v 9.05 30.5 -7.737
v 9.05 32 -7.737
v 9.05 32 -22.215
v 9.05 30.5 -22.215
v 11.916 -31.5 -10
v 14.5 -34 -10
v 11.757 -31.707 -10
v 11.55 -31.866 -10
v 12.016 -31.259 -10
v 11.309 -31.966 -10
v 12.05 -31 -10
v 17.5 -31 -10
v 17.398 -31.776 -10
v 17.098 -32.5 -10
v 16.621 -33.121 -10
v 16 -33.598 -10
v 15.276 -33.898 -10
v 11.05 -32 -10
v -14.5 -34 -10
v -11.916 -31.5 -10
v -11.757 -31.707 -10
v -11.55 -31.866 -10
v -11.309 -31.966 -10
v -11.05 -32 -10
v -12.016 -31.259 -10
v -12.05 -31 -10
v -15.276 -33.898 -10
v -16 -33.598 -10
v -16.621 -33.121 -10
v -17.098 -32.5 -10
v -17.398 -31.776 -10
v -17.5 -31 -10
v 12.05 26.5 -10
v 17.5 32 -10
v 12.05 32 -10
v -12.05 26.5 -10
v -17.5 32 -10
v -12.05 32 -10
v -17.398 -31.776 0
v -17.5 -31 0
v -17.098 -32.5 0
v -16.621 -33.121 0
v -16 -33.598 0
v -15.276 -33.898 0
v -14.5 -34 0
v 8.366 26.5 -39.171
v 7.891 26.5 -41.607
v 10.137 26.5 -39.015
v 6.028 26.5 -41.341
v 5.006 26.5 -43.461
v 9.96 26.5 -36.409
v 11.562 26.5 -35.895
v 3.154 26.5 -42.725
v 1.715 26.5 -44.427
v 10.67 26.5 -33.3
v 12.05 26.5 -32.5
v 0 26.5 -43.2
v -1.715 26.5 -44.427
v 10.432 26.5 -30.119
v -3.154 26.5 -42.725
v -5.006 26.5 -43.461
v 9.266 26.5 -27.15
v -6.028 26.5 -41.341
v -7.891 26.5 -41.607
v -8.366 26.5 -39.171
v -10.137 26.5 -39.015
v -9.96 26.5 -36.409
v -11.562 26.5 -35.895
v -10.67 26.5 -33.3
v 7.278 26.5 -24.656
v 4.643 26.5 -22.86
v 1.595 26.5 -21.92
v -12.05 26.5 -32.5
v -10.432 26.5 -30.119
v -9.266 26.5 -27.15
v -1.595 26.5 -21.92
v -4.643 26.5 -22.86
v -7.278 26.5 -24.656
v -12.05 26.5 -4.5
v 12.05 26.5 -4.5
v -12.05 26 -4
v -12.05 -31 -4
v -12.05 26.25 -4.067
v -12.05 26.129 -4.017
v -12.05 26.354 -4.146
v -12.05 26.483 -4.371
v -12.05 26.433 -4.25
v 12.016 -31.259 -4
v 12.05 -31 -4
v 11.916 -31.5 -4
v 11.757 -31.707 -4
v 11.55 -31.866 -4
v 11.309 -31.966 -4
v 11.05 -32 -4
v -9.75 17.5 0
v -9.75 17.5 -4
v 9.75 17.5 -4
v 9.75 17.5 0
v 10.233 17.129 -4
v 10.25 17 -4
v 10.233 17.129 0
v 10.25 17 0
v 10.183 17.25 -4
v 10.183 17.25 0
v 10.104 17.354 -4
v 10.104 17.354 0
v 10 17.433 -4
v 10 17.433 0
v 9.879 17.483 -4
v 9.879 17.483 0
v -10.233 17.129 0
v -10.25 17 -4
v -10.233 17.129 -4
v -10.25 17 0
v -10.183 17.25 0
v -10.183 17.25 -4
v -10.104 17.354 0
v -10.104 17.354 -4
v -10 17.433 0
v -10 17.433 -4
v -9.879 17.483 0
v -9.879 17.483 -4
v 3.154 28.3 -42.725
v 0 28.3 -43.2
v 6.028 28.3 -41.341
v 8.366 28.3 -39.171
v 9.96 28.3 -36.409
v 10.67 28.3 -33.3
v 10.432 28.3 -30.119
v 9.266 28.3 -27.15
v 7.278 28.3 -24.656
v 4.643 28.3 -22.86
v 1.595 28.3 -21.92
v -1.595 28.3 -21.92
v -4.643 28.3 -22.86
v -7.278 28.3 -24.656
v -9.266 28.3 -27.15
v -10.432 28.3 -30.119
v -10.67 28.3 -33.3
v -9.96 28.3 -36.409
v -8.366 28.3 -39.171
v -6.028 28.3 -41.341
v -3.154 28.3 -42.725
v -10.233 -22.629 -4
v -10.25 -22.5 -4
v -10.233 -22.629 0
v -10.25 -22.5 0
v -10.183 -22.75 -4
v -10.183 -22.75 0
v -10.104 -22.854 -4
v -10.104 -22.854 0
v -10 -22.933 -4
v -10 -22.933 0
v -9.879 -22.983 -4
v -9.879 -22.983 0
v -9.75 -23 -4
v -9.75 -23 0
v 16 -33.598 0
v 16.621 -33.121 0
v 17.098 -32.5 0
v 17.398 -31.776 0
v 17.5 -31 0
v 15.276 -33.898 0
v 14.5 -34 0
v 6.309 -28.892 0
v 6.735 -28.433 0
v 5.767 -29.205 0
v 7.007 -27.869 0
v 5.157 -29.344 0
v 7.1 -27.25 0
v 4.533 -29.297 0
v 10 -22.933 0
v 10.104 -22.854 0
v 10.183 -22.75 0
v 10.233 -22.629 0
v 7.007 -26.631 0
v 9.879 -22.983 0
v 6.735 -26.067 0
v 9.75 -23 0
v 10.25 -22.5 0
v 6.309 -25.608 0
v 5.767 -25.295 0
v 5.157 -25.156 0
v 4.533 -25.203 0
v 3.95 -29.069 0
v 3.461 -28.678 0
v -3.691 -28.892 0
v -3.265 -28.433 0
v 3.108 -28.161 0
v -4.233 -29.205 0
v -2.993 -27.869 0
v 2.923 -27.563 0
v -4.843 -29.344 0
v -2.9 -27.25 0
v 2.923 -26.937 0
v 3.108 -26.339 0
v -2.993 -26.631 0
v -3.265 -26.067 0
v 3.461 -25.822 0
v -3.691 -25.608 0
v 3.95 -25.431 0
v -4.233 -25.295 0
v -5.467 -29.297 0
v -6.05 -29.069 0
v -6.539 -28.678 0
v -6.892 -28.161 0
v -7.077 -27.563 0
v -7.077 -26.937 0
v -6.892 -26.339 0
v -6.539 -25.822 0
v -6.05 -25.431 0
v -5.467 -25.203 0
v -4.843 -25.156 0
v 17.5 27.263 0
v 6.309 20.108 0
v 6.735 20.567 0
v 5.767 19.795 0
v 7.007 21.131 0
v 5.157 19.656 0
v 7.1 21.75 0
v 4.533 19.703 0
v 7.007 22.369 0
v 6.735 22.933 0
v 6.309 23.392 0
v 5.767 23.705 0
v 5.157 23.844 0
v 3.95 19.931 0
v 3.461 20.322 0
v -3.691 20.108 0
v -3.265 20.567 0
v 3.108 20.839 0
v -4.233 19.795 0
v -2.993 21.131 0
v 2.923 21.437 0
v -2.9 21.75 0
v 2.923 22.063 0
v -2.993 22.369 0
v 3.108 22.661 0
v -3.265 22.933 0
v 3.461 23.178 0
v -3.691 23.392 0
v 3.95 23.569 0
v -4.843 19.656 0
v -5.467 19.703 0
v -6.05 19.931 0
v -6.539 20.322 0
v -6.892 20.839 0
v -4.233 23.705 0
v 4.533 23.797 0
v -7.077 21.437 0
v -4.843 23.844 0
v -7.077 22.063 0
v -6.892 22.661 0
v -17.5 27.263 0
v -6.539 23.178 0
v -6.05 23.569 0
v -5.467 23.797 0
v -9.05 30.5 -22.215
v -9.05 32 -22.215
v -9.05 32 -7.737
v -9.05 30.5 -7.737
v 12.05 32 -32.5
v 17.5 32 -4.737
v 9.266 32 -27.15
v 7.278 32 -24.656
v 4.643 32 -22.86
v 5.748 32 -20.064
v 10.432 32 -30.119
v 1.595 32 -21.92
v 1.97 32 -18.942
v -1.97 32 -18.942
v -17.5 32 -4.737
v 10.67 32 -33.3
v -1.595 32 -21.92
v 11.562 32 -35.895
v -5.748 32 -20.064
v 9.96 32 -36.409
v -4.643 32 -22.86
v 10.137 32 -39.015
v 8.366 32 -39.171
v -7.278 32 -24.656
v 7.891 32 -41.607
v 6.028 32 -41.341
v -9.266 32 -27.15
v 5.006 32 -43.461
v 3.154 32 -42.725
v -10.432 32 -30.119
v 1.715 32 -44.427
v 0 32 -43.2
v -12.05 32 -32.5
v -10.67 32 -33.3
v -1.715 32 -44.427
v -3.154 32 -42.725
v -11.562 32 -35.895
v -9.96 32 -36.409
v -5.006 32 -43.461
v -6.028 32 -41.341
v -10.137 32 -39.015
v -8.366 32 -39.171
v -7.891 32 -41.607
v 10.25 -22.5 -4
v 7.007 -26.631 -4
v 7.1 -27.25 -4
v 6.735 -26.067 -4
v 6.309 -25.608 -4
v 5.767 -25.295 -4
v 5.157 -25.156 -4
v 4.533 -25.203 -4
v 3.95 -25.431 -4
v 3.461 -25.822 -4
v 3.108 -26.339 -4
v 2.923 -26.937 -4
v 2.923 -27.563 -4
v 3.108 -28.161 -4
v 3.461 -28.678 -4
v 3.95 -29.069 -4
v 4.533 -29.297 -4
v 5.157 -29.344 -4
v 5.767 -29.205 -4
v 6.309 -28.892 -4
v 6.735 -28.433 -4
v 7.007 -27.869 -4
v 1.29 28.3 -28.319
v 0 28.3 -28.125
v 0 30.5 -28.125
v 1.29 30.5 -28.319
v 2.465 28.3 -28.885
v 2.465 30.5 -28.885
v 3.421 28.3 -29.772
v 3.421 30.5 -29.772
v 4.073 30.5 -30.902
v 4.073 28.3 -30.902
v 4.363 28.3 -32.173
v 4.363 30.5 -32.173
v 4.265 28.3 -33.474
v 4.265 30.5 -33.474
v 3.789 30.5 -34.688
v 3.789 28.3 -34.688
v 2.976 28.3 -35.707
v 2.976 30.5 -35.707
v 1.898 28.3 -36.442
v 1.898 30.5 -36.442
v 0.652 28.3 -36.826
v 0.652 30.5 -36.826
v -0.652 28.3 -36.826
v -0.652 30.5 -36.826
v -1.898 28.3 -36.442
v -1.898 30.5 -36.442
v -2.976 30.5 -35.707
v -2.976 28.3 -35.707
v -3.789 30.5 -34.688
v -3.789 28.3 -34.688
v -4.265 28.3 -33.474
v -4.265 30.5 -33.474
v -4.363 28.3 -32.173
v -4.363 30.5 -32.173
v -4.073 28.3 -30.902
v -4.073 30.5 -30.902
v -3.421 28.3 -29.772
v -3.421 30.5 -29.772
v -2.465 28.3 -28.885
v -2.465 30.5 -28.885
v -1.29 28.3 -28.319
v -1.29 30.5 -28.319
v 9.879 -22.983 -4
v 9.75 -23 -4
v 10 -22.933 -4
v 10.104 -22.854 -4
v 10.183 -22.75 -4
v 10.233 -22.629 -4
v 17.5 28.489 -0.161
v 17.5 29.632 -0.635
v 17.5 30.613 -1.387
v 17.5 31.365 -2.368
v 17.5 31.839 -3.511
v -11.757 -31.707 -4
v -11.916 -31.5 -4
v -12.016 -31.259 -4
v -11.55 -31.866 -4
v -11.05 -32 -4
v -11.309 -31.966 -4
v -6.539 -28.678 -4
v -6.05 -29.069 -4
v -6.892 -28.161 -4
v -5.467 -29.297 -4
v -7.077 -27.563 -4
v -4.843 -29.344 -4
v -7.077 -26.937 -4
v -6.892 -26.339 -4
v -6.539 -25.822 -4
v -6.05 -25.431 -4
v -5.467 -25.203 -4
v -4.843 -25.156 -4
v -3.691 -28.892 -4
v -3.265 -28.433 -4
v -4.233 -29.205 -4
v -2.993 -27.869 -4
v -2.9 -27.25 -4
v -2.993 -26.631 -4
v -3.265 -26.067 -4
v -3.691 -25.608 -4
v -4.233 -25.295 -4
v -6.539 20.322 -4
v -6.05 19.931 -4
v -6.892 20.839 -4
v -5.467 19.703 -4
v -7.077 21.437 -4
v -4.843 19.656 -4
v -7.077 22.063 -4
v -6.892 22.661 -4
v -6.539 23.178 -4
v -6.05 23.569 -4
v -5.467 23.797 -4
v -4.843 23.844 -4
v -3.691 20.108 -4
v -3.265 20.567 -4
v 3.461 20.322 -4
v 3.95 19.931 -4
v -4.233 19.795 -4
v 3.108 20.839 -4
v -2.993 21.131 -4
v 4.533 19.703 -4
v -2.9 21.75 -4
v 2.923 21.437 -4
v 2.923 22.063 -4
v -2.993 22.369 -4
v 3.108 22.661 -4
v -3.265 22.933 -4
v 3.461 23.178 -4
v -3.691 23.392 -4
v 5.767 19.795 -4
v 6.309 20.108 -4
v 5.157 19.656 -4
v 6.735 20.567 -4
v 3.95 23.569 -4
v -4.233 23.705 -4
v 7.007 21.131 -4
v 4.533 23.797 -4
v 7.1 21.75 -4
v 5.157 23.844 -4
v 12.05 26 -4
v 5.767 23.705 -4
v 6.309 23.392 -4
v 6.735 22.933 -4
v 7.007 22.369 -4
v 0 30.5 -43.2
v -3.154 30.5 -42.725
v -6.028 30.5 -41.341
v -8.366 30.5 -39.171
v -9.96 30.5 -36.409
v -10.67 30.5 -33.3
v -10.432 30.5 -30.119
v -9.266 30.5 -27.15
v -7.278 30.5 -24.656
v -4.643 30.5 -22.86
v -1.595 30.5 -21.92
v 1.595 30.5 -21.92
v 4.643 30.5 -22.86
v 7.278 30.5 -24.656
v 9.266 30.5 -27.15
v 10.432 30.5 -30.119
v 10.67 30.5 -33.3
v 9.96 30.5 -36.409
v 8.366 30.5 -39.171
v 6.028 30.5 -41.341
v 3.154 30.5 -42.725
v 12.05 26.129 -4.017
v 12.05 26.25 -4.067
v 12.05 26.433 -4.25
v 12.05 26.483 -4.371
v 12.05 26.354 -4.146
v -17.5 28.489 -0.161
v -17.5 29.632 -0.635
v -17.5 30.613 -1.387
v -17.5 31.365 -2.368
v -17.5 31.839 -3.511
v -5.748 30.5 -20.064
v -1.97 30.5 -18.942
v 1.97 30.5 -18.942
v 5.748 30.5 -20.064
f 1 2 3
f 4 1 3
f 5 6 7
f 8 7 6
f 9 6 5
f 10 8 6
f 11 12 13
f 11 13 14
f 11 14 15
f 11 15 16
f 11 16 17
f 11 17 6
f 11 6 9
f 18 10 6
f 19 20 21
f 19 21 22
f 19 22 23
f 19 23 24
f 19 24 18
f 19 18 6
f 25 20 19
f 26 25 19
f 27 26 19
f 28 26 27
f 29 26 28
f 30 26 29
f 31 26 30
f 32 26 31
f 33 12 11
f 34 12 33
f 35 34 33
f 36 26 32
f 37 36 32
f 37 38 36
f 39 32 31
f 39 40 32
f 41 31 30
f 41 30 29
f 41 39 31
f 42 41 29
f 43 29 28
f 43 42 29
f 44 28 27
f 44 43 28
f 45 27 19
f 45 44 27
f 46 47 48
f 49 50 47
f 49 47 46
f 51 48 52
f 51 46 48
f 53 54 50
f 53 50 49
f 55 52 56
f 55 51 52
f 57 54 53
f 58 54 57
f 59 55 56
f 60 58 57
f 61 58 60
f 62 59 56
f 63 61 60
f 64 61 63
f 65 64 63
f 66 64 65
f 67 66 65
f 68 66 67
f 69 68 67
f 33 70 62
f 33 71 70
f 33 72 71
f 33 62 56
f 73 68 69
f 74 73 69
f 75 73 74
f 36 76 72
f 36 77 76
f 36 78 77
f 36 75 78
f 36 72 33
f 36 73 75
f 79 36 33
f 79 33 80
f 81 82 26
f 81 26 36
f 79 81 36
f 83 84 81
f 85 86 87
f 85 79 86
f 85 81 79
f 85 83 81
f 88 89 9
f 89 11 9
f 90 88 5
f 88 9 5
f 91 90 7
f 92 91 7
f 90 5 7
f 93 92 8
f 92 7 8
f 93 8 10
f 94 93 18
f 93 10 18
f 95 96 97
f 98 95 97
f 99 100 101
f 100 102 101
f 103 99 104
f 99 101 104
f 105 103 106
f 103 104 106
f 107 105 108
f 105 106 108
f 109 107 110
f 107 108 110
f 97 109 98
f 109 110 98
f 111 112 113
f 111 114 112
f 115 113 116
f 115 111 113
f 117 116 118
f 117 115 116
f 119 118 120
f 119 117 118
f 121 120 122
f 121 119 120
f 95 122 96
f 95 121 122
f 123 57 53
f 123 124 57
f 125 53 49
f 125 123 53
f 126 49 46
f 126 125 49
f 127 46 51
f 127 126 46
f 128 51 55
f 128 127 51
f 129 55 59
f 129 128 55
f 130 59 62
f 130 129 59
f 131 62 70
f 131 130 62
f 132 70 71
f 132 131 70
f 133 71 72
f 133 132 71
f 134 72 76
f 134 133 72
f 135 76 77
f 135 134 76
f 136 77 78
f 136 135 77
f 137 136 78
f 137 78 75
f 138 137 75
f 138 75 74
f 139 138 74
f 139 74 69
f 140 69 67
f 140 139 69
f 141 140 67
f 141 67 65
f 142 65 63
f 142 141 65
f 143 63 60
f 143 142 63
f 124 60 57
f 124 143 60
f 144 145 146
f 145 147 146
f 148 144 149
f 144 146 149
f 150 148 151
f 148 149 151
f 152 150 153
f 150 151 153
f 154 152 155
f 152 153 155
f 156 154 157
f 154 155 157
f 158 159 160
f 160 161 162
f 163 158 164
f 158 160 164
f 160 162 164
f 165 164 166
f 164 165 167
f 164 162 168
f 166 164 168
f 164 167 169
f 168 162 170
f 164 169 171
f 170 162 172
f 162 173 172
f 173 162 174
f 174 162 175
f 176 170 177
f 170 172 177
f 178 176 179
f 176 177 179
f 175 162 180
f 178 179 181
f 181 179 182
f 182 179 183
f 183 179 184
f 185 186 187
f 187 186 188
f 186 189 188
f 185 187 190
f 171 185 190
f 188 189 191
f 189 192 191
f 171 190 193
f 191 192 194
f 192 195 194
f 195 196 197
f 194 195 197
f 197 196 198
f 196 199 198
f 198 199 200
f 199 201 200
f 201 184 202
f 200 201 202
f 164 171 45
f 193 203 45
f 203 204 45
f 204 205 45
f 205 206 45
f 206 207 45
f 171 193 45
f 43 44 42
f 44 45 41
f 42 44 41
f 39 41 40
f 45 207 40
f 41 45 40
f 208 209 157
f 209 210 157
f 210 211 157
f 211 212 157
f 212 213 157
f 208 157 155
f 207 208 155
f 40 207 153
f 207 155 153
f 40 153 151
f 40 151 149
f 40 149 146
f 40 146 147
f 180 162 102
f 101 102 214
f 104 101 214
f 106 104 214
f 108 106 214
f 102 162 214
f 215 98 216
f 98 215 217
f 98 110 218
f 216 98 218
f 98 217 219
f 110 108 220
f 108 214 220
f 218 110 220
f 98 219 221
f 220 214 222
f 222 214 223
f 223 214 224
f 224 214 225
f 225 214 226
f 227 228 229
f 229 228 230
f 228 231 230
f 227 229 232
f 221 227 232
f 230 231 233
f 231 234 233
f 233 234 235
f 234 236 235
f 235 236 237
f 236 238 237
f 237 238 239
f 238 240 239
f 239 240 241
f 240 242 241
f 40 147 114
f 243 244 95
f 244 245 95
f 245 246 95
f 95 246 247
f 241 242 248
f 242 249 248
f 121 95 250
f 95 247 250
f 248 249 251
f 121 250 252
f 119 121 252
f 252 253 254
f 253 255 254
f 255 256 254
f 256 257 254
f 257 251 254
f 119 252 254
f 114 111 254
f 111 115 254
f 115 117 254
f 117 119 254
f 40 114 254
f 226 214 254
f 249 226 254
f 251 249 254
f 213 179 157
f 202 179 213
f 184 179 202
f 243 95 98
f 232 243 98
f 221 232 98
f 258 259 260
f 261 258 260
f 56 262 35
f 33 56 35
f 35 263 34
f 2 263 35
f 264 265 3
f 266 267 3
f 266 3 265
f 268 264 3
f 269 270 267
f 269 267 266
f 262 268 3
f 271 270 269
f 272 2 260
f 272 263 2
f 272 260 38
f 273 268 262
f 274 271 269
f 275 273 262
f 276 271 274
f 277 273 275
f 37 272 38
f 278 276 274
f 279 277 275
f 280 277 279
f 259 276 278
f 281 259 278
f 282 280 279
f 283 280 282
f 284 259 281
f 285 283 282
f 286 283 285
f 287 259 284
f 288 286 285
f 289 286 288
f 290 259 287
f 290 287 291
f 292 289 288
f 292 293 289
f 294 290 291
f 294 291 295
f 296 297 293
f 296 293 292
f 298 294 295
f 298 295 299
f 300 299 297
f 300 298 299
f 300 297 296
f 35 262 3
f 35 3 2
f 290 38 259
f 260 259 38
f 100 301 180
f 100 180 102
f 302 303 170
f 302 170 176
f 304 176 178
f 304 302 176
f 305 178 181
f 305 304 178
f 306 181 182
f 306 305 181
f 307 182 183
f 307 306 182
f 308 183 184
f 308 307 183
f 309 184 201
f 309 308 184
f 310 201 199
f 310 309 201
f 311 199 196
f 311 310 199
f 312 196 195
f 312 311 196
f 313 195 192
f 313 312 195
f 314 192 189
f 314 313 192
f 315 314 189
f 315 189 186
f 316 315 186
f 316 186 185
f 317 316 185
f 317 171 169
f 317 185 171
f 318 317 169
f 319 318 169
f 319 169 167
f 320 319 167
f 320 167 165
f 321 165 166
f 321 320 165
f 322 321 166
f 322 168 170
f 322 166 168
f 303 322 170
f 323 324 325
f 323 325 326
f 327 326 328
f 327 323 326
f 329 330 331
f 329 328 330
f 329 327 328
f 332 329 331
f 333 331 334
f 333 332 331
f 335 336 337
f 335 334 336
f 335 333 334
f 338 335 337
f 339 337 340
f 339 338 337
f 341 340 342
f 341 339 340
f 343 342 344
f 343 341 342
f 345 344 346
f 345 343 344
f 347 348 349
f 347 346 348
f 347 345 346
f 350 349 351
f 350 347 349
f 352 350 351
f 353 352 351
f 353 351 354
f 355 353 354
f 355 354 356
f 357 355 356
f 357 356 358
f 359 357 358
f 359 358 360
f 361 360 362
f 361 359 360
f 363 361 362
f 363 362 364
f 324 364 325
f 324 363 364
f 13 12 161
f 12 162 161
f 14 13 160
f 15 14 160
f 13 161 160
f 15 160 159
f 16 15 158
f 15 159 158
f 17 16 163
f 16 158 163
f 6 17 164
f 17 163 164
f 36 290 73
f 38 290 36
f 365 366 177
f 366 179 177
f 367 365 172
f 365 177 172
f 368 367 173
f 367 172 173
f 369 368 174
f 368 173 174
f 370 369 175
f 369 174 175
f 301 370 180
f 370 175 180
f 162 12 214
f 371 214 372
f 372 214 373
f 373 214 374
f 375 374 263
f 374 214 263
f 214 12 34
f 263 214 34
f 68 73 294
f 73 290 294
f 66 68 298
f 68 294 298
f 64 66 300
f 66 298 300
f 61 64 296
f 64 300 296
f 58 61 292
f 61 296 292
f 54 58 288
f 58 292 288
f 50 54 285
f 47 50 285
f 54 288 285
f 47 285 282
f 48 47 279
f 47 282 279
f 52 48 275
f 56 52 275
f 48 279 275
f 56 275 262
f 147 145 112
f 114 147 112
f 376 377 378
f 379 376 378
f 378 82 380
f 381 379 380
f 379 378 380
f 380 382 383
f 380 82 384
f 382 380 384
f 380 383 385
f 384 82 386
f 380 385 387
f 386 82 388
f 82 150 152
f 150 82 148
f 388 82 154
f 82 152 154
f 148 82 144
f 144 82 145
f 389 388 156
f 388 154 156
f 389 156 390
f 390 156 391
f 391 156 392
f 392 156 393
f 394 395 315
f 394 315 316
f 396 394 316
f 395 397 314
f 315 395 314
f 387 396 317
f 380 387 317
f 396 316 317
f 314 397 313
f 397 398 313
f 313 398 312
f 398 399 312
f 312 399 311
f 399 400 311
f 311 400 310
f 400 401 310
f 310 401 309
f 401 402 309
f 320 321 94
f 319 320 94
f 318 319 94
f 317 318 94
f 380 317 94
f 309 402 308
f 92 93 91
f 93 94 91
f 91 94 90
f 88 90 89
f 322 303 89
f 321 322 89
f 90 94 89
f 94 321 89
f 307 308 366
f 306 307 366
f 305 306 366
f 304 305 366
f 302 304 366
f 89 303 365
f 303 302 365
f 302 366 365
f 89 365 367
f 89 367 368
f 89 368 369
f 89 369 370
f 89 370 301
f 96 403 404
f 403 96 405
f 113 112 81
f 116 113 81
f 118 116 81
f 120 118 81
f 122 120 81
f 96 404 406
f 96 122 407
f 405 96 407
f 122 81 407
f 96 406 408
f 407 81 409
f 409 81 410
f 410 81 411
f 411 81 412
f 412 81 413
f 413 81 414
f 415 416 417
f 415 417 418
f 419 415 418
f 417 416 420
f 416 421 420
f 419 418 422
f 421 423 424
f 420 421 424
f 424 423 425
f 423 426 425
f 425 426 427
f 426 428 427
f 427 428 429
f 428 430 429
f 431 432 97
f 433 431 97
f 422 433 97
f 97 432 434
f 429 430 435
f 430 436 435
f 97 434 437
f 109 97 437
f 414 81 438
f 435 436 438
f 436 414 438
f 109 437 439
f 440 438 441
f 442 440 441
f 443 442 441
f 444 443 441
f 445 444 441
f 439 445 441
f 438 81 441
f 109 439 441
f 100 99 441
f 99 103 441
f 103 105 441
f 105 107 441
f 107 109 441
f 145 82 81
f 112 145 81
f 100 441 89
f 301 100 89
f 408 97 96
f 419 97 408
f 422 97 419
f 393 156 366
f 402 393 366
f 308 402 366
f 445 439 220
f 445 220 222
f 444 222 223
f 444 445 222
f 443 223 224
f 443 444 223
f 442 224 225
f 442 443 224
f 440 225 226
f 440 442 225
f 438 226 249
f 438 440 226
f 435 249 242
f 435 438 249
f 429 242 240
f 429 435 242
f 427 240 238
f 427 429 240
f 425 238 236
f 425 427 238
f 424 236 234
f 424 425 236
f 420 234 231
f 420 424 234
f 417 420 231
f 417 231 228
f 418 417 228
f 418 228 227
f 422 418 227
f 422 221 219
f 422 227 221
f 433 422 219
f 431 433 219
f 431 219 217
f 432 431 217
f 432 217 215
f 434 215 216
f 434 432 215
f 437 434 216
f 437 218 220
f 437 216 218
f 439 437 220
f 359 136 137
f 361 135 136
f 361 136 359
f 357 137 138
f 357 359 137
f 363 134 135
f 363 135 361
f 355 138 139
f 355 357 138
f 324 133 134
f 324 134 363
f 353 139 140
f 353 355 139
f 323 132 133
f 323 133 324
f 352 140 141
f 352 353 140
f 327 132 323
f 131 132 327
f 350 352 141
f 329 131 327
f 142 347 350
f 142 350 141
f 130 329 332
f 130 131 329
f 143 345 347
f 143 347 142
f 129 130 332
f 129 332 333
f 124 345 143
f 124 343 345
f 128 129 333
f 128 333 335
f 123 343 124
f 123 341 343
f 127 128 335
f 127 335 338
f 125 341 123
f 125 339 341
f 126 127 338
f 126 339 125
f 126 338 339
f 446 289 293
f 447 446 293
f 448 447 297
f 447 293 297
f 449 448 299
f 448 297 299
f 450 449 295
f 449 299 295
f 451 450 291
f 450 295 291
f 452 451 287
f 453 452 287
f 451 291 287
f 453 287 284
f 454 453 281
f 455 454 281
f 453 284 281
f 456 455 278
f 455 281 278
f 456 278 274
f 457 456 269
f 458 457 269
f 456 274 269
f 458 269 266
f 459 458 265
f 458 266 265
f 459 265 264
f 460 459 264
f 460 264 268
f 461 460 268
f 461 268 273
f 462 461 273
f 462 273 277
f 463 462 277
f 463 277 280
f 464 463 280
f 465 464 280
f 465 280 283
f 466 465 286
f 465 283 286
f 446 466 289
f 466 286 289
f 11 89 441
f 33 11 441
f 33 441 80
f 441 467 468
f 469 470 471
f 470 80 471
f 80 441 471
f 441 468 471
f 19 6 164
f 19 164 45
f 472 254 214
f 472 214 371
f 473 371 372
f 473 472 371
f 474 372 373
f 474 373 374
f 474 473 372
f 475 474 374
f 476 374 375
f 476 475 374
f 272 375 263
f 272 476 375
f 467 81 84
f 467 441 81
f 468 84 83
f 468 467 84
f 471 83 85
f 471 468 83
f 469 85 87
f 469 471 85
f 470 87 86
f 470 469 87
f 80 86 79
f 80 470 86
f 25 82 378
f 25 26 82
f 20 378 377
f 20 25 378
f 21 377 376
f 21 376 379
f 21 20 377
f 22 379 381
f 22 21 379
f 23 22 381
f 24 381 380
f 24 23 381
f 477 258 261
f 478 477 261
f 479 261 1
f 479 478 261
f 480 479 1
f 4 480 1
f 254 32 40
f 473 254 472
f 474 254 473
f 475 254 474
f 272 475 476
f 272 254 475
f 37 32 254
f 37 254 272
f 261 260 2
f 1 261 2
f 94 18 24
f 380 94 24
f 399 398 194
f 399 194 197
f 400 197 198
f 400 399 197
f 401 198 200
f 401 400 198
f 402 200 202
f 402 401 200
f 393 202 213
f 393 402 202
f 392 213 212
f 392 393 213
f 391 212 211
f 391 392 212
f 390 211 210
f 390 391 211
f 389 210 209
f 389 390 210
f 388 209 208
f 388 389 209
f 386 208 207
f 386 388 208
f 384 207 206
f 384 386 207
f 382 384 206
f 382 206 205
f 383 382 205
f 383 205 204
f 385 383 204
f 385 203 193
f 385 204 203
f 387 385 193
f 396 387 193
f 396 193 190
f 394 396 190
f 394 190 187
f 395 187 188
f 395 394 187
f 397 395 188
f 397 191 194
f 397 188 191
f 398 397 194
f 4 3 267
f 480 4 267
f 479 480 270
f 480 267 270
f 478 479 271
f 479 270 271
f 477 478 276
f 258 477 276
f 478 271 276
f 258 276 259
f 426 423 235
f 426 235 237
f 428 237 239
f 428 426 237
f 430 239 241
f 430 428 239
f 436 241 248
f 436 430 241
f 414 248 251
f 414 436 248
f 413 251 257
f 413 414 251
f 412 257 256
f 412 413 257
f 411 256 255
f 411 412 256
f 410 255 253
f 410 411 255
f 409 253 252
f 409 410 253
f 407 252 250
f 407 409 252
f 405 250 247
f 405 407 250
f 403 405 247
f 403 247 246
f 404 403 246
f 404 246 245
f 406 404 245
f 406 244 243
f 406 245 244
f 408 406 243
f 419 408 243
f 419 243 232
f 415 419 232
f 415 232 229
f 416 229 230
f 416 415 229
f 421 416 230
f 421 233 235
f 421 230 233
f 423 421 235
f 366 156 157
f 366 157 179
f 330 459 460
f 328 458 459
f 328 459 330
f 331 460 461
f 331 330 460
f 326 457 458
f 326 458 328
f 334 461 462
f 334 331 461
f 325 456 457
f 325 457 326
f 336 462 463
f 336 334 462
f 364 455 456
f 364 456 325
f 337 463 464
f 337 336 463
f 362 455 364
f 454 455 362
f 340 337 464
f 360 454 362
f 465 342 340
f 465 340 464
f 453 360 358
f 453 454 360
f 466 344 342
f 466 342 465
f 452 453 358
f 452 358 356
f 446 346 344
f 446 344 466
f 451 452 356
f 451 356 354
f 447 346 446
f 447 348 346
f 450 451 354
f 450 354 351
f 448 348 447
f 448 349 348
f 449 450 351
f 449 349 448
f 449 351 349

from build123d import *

# Parameters (mm, degrees)
SKETCH1_W                    = 35
SKETCH1_H                    = 64
BASE_FLANGE1_DEPTH           = 4
EDGE_FLANGE1_STRIP_W         = 17.4732
EDGE_FLANGE1_STRIP_H         = 4
EDGE_FLANGE1_STRIP_CUT_DEPTH = 35
EDGE_FLANGE1_DEPTH           = 35
CUT_EXTRUDE1_DEPTH           = 62.889013565
CUT_EXTRUDE1_DEPTH_BACK      = 62.889013565
SKETCH10_W                   = 20.5
SKETCH10_H                   = 40.5
CUT_EXTRUDE2_DEPTH           = 84.079780934
CUT_EXTRUDE2_DEPTH_BACK      = 84.079780934
SKETCH11_R                   = 4.375
FILLET1_R                    = 17
CUT_EXTRUDE3_DEPTH           = 84.079780934
CUT_EXTRUDE3_DEPTH_BACK      = 84.079780934
CUT_EXTRUDE4_DEPTH           = 58.575624182
CUT_EXTRUDE4_DEPTH_BACK      = 58.575624182
SKETCH14_R                   = 2.1
SKETCH16_R                   = 10.7
CUT_EXTRUDE5_DEPTH           = 0.3
SKETCH21_W                   = 5.45
SKETCH21_H                   = 60
BOSS_EXTRUDE1_DEPTH          = 6
SKETCH23_W                   = 35
SKETCH23_H                   = 2
BOSS_EXTRUDE2_DEPTH          = 10
FILLET2_R                    = 3
FILLET3_R                    = 0.5
FILLET4_R                    = 1
DELETEFACE1_START            = -12.05
DELETEFACE1_DEPTH            = 24.1
MOVE_FACE2_BY                = 1.5
FILLET5_R                    = 0.5
SKETCH26_R                   = 10.7
CUT_EXTRUDE6_DEPTH           = 1.5


# Read off the part's stored shape, not the designer's step: DeleteFace1
# Sheet-metal steps are written as plain solids
with BuildPart() as part:
    # Sketch1 → Base-Flange1 (new body)
    with BuildSketch(Plane.XY):
        Rectangle(SKETCH1_W, SKETCH1_H)
    extrude(amount=-BASE_FLANGE1_DEPTH)

    # Edge-Flange1 strip (across the edge) → Edge-Flange1 strip cut (cut)
    with BuildSketch(Plane(origin=(-17.5, 32, -4), x_dir=(0, -1, 0), z_dir=(1, 0, 0))):
        with Locations((-4, -2)):
            Rectangle(EDGE_FLANGE1_STRIP_W, EDGE_FLANGE1_STRIP_H)
    extrude(amount=EDGE_FLANGE1_STRIP_CUT_DEPTH, mode=Mode.SUBTRACT)

    # Edge-Flange1 section (across the edge) → Edge-Flange1 (add)
    with BuildSketch(Plane(origin=(-17.5, 32, -4), x_dir=(0, -1, 0), z_dir=(1, 0, 0))):
        with BuildLine():
            Line((0, 0.7366), (0, 46))
            Line((0, 46), (4, 46))
            Line((4, 46), (4, 0.7366))
            ThreePointArc((4, 0.7366), (4.215745145, 0.215745145), (4.7366, 0))
            Line((4.7366, 0), (4.7366, -4))
            ThreePointArc((4.7366, -4), (1.38731802, -2.61268198), (0, 0.7366))
        make_face()
    extrude(amount=EDGE_FLANGE1_DEPTH)

    # Sketch10 → Cut-Extrude1 (cut, two sides: drawn at the far end of the back side and taken through both)
    with BuildSketch(Plane.XY.offset(-CUT_EXTRUDE1_DEPTH_BACK)):
        with Locations((0, -2.75)):
            Rectangle(SKETCH10_W, SKETCH10_H)
    extrude(amount=CUT_EXTRUDE1_DEPTH + CUT_EXTRUDE1_DEPTH_BACK, mode=Mode.SUBTRACT)

    # Sketch11 → Cut-Extrude2 (cut, two sides: drawn at the far end of the back side and taken through both)
    with BuildSketch(Plane(origin=(0, 32, 0), x_dir=(1, 0, 0), z_dir=(0, 1, 0)).offset(-CUT_EXTRUDE2_DEPTH_BACK)):
        with Locations(Location((0, 32.5, 0), (0, 0, 270))):
            Circle(SKETCH11_R)
    extrude(amount=CUT_EXTRUDE2_DEPTH + CUT_EXTRUDE2_DEPTH_BACK, mode=Mode.SUBTRACT)

    # Fillet1
    fillet1_edges = [part.edges().sort_by_distance(p)[0] for p in [
        (-17.5, 30, -50),
        (17.5, 30, -50),
    ]]
    fillet(fillet1_edges, radius=FILLET1_R)

    # Sketch13 → Cut-Extrude3 (cut, two sides: drawn at the far end of the back side and taken through both)
    with BuildSketch(Plane(origin=(0, 32, 0), x_dir=(1, 0, 0), z_dir=(0, 1, 0)).offset(-CUT_EXTRUDE3_DEPTH_BACK)):
        with BuildLine():
            Line((12.05, 10), (40.591208969, 10))
            Line((40.591208969, 10), (40.591208969, 59.144369897))
            Line((40.591208969, 59.144369897), (-43.376880173, 59.144369897))
            Line((-43.376880173, 59.144369897), (-43.376880173, 10))
            Line((-43.376880173, 10), (-12.05, 10))
            Line((-12.05, 10), (-12.05, 32.499999826))
            ThreePointArc((-12.05, 32.499999826), (0, 44.55), (12.05, 32.499999826))
            Line((12.05, 32.499999826), (12.05, 10))
        make_face()
    extrude(amount=CUT_EXTRUDE3_DEPTH + CUT_EXTRUDE3_DEPTH_BACK, mode=Mode.SUBTRACT)

    # Sketch14 → Cut-Extrude4 (cut, two sides: drawn at the far end of the back side and taken through both)
    with BuildSketch(Plane.XY.offset(-CUT_EXTRUDE4_DEPTH_BACK)):
        with Locations((-5, 21.75)):
            Circle(SKETCH14_R)
        with Locations((-5, -27.25)):
            Circle(SKETCH14_R)
        with Locations((5, -27.25)):
            Circle(SKETCH14_R)
        with Locations((5, 21.75)):
            Circle(SKETCH14_R)
    extrude(amount=CUT_EXTRUDE4_DEPTH + CUT_EXTRUDE4_DEPTH_BACK, mode=Mode.SUBTRACT)

    # Sketch16 → Cut-Extrude5 (cut)
    with BuildSketch(Plane.XZ.offset(-28)):
        with Locations(Location((0, -32.5, 0), (0, 0, 270))):
            Circle(SKETCH16_R)
    extrude(amount=-CUT_EXTRUDE5_DEPTH, mode=Mode.SUBTRACT)

    # Sketch21 → Boss-Extrude1 (add)
    with BuildSketch(Plane(origin=(0, 0, -4), x_dir=(-1, 0, 0), z_dir=(0, 0, -1))):
        with Locations((-14.775, -2)):
            Rectangle(SKETCH21_W, SKETCH21_H)
        with Locations((14.775, -2)):
            Rectangle(SKETCH21_W, SKETCH21_H)
    extrude(amount=BOSS_EXTRUDE1_DEPTH)

    # Sketch23 → Boss-Extrude2 (add)
    with BuildSketch(Plane(origin=(0, 0, -10), x_dir=(-1, 0, 0), z_dir=(0, 0, -1))):
        with Locations((0, -33)):
            Rectangle(SKETCH23_W, SKETCH23_H)
    extrude(amount=-BOSS_EXTRUDE2_DEPTH)

    # Fillet2
    fillet2_edges = [part.edges().sort_by_distance(p)[0] for p in [
        (-17.5, -34, -5),
        (17.5, -34, -5),
    ]]
    fillet(fillet2_edges, radius=FILLET2_R)

    # Fillet3
    fillet3_edges = [part.edges().sort_by_distance(p)[0] for p in [
        (10.25, 17.5, -2),
        (10.25, -23, -2),
        (-10.25, -23, -2),
        (-10.25, 17.5, -2),
    ]]
    fillet(fillet3_edges, radius=FILLET3_R)

    # Fillet4
    fillet4_edges = [part.edges().sort_by_distance(p)[0] for p in [
        (12.05, -32, -7),
        (-12.05, -32, -7),
    ]]
    fillet(fillet4_edges, radius=FILLET4_R)

    # DeleteFace1 outline → DeleteFace1 (cut)
    with BuildSketch(Plane.YZ.offset(DELETEFACE1_START)):
        with BuildLine():
            ThreePointArc((27.2634, -4), (27.784254855, -4.215745145), (28, -4.7366))
            Line((28, -4.7366), (28, -4))
            Line((28, -4), (27.2634, -4))
        make_face()
    extrude(amount=DELETEFACE1_DEPTH, mode=Mode.SUBTRACT)

    # Move Face2: a face moved outward by 1.5
    extrude(part.faces().sort_by_distance((0, 28, -16.973459017))[0], amount=MOVE_FACE2_BY, dir=(0, -1, 0))

    # Fillet5
    fillet5_edges = [part.edges().sort_by_distance(p)[0] for p in [
        (0, 26.5, -4),
    ]]
    fillet(fillet5_edges, radius=FILLET5_R)

    # Sketch26 → Cut-Extrude6 (cut)
    with BuildSketch(Plane(origin=(0, 32, 0), x_dir=(1, 0, 0), z_dir=(0, 1, 0))):
        with Locations(Location((0, 32.5, 0), (0, 0, 90))):
            Circle(SKETCH26_R)
        with BuildLine():
            Line((-9.05, 22.214694949), (-9.05, 7.7366))
            Line((-9.05, 7.7366), (9.05, 7.7366))
            Line((9.05, 7.7366), (9.05, 22.214694949))
            ThreePointArc((9.05, 22.214694949), (0, 18.8), (-9.05, 22.214694949))
        make_face()
    extrude(amount=-CUT_EXTRUDE6_DEPTH, mode=Mode.SUBTRACT)


solid = part.part
